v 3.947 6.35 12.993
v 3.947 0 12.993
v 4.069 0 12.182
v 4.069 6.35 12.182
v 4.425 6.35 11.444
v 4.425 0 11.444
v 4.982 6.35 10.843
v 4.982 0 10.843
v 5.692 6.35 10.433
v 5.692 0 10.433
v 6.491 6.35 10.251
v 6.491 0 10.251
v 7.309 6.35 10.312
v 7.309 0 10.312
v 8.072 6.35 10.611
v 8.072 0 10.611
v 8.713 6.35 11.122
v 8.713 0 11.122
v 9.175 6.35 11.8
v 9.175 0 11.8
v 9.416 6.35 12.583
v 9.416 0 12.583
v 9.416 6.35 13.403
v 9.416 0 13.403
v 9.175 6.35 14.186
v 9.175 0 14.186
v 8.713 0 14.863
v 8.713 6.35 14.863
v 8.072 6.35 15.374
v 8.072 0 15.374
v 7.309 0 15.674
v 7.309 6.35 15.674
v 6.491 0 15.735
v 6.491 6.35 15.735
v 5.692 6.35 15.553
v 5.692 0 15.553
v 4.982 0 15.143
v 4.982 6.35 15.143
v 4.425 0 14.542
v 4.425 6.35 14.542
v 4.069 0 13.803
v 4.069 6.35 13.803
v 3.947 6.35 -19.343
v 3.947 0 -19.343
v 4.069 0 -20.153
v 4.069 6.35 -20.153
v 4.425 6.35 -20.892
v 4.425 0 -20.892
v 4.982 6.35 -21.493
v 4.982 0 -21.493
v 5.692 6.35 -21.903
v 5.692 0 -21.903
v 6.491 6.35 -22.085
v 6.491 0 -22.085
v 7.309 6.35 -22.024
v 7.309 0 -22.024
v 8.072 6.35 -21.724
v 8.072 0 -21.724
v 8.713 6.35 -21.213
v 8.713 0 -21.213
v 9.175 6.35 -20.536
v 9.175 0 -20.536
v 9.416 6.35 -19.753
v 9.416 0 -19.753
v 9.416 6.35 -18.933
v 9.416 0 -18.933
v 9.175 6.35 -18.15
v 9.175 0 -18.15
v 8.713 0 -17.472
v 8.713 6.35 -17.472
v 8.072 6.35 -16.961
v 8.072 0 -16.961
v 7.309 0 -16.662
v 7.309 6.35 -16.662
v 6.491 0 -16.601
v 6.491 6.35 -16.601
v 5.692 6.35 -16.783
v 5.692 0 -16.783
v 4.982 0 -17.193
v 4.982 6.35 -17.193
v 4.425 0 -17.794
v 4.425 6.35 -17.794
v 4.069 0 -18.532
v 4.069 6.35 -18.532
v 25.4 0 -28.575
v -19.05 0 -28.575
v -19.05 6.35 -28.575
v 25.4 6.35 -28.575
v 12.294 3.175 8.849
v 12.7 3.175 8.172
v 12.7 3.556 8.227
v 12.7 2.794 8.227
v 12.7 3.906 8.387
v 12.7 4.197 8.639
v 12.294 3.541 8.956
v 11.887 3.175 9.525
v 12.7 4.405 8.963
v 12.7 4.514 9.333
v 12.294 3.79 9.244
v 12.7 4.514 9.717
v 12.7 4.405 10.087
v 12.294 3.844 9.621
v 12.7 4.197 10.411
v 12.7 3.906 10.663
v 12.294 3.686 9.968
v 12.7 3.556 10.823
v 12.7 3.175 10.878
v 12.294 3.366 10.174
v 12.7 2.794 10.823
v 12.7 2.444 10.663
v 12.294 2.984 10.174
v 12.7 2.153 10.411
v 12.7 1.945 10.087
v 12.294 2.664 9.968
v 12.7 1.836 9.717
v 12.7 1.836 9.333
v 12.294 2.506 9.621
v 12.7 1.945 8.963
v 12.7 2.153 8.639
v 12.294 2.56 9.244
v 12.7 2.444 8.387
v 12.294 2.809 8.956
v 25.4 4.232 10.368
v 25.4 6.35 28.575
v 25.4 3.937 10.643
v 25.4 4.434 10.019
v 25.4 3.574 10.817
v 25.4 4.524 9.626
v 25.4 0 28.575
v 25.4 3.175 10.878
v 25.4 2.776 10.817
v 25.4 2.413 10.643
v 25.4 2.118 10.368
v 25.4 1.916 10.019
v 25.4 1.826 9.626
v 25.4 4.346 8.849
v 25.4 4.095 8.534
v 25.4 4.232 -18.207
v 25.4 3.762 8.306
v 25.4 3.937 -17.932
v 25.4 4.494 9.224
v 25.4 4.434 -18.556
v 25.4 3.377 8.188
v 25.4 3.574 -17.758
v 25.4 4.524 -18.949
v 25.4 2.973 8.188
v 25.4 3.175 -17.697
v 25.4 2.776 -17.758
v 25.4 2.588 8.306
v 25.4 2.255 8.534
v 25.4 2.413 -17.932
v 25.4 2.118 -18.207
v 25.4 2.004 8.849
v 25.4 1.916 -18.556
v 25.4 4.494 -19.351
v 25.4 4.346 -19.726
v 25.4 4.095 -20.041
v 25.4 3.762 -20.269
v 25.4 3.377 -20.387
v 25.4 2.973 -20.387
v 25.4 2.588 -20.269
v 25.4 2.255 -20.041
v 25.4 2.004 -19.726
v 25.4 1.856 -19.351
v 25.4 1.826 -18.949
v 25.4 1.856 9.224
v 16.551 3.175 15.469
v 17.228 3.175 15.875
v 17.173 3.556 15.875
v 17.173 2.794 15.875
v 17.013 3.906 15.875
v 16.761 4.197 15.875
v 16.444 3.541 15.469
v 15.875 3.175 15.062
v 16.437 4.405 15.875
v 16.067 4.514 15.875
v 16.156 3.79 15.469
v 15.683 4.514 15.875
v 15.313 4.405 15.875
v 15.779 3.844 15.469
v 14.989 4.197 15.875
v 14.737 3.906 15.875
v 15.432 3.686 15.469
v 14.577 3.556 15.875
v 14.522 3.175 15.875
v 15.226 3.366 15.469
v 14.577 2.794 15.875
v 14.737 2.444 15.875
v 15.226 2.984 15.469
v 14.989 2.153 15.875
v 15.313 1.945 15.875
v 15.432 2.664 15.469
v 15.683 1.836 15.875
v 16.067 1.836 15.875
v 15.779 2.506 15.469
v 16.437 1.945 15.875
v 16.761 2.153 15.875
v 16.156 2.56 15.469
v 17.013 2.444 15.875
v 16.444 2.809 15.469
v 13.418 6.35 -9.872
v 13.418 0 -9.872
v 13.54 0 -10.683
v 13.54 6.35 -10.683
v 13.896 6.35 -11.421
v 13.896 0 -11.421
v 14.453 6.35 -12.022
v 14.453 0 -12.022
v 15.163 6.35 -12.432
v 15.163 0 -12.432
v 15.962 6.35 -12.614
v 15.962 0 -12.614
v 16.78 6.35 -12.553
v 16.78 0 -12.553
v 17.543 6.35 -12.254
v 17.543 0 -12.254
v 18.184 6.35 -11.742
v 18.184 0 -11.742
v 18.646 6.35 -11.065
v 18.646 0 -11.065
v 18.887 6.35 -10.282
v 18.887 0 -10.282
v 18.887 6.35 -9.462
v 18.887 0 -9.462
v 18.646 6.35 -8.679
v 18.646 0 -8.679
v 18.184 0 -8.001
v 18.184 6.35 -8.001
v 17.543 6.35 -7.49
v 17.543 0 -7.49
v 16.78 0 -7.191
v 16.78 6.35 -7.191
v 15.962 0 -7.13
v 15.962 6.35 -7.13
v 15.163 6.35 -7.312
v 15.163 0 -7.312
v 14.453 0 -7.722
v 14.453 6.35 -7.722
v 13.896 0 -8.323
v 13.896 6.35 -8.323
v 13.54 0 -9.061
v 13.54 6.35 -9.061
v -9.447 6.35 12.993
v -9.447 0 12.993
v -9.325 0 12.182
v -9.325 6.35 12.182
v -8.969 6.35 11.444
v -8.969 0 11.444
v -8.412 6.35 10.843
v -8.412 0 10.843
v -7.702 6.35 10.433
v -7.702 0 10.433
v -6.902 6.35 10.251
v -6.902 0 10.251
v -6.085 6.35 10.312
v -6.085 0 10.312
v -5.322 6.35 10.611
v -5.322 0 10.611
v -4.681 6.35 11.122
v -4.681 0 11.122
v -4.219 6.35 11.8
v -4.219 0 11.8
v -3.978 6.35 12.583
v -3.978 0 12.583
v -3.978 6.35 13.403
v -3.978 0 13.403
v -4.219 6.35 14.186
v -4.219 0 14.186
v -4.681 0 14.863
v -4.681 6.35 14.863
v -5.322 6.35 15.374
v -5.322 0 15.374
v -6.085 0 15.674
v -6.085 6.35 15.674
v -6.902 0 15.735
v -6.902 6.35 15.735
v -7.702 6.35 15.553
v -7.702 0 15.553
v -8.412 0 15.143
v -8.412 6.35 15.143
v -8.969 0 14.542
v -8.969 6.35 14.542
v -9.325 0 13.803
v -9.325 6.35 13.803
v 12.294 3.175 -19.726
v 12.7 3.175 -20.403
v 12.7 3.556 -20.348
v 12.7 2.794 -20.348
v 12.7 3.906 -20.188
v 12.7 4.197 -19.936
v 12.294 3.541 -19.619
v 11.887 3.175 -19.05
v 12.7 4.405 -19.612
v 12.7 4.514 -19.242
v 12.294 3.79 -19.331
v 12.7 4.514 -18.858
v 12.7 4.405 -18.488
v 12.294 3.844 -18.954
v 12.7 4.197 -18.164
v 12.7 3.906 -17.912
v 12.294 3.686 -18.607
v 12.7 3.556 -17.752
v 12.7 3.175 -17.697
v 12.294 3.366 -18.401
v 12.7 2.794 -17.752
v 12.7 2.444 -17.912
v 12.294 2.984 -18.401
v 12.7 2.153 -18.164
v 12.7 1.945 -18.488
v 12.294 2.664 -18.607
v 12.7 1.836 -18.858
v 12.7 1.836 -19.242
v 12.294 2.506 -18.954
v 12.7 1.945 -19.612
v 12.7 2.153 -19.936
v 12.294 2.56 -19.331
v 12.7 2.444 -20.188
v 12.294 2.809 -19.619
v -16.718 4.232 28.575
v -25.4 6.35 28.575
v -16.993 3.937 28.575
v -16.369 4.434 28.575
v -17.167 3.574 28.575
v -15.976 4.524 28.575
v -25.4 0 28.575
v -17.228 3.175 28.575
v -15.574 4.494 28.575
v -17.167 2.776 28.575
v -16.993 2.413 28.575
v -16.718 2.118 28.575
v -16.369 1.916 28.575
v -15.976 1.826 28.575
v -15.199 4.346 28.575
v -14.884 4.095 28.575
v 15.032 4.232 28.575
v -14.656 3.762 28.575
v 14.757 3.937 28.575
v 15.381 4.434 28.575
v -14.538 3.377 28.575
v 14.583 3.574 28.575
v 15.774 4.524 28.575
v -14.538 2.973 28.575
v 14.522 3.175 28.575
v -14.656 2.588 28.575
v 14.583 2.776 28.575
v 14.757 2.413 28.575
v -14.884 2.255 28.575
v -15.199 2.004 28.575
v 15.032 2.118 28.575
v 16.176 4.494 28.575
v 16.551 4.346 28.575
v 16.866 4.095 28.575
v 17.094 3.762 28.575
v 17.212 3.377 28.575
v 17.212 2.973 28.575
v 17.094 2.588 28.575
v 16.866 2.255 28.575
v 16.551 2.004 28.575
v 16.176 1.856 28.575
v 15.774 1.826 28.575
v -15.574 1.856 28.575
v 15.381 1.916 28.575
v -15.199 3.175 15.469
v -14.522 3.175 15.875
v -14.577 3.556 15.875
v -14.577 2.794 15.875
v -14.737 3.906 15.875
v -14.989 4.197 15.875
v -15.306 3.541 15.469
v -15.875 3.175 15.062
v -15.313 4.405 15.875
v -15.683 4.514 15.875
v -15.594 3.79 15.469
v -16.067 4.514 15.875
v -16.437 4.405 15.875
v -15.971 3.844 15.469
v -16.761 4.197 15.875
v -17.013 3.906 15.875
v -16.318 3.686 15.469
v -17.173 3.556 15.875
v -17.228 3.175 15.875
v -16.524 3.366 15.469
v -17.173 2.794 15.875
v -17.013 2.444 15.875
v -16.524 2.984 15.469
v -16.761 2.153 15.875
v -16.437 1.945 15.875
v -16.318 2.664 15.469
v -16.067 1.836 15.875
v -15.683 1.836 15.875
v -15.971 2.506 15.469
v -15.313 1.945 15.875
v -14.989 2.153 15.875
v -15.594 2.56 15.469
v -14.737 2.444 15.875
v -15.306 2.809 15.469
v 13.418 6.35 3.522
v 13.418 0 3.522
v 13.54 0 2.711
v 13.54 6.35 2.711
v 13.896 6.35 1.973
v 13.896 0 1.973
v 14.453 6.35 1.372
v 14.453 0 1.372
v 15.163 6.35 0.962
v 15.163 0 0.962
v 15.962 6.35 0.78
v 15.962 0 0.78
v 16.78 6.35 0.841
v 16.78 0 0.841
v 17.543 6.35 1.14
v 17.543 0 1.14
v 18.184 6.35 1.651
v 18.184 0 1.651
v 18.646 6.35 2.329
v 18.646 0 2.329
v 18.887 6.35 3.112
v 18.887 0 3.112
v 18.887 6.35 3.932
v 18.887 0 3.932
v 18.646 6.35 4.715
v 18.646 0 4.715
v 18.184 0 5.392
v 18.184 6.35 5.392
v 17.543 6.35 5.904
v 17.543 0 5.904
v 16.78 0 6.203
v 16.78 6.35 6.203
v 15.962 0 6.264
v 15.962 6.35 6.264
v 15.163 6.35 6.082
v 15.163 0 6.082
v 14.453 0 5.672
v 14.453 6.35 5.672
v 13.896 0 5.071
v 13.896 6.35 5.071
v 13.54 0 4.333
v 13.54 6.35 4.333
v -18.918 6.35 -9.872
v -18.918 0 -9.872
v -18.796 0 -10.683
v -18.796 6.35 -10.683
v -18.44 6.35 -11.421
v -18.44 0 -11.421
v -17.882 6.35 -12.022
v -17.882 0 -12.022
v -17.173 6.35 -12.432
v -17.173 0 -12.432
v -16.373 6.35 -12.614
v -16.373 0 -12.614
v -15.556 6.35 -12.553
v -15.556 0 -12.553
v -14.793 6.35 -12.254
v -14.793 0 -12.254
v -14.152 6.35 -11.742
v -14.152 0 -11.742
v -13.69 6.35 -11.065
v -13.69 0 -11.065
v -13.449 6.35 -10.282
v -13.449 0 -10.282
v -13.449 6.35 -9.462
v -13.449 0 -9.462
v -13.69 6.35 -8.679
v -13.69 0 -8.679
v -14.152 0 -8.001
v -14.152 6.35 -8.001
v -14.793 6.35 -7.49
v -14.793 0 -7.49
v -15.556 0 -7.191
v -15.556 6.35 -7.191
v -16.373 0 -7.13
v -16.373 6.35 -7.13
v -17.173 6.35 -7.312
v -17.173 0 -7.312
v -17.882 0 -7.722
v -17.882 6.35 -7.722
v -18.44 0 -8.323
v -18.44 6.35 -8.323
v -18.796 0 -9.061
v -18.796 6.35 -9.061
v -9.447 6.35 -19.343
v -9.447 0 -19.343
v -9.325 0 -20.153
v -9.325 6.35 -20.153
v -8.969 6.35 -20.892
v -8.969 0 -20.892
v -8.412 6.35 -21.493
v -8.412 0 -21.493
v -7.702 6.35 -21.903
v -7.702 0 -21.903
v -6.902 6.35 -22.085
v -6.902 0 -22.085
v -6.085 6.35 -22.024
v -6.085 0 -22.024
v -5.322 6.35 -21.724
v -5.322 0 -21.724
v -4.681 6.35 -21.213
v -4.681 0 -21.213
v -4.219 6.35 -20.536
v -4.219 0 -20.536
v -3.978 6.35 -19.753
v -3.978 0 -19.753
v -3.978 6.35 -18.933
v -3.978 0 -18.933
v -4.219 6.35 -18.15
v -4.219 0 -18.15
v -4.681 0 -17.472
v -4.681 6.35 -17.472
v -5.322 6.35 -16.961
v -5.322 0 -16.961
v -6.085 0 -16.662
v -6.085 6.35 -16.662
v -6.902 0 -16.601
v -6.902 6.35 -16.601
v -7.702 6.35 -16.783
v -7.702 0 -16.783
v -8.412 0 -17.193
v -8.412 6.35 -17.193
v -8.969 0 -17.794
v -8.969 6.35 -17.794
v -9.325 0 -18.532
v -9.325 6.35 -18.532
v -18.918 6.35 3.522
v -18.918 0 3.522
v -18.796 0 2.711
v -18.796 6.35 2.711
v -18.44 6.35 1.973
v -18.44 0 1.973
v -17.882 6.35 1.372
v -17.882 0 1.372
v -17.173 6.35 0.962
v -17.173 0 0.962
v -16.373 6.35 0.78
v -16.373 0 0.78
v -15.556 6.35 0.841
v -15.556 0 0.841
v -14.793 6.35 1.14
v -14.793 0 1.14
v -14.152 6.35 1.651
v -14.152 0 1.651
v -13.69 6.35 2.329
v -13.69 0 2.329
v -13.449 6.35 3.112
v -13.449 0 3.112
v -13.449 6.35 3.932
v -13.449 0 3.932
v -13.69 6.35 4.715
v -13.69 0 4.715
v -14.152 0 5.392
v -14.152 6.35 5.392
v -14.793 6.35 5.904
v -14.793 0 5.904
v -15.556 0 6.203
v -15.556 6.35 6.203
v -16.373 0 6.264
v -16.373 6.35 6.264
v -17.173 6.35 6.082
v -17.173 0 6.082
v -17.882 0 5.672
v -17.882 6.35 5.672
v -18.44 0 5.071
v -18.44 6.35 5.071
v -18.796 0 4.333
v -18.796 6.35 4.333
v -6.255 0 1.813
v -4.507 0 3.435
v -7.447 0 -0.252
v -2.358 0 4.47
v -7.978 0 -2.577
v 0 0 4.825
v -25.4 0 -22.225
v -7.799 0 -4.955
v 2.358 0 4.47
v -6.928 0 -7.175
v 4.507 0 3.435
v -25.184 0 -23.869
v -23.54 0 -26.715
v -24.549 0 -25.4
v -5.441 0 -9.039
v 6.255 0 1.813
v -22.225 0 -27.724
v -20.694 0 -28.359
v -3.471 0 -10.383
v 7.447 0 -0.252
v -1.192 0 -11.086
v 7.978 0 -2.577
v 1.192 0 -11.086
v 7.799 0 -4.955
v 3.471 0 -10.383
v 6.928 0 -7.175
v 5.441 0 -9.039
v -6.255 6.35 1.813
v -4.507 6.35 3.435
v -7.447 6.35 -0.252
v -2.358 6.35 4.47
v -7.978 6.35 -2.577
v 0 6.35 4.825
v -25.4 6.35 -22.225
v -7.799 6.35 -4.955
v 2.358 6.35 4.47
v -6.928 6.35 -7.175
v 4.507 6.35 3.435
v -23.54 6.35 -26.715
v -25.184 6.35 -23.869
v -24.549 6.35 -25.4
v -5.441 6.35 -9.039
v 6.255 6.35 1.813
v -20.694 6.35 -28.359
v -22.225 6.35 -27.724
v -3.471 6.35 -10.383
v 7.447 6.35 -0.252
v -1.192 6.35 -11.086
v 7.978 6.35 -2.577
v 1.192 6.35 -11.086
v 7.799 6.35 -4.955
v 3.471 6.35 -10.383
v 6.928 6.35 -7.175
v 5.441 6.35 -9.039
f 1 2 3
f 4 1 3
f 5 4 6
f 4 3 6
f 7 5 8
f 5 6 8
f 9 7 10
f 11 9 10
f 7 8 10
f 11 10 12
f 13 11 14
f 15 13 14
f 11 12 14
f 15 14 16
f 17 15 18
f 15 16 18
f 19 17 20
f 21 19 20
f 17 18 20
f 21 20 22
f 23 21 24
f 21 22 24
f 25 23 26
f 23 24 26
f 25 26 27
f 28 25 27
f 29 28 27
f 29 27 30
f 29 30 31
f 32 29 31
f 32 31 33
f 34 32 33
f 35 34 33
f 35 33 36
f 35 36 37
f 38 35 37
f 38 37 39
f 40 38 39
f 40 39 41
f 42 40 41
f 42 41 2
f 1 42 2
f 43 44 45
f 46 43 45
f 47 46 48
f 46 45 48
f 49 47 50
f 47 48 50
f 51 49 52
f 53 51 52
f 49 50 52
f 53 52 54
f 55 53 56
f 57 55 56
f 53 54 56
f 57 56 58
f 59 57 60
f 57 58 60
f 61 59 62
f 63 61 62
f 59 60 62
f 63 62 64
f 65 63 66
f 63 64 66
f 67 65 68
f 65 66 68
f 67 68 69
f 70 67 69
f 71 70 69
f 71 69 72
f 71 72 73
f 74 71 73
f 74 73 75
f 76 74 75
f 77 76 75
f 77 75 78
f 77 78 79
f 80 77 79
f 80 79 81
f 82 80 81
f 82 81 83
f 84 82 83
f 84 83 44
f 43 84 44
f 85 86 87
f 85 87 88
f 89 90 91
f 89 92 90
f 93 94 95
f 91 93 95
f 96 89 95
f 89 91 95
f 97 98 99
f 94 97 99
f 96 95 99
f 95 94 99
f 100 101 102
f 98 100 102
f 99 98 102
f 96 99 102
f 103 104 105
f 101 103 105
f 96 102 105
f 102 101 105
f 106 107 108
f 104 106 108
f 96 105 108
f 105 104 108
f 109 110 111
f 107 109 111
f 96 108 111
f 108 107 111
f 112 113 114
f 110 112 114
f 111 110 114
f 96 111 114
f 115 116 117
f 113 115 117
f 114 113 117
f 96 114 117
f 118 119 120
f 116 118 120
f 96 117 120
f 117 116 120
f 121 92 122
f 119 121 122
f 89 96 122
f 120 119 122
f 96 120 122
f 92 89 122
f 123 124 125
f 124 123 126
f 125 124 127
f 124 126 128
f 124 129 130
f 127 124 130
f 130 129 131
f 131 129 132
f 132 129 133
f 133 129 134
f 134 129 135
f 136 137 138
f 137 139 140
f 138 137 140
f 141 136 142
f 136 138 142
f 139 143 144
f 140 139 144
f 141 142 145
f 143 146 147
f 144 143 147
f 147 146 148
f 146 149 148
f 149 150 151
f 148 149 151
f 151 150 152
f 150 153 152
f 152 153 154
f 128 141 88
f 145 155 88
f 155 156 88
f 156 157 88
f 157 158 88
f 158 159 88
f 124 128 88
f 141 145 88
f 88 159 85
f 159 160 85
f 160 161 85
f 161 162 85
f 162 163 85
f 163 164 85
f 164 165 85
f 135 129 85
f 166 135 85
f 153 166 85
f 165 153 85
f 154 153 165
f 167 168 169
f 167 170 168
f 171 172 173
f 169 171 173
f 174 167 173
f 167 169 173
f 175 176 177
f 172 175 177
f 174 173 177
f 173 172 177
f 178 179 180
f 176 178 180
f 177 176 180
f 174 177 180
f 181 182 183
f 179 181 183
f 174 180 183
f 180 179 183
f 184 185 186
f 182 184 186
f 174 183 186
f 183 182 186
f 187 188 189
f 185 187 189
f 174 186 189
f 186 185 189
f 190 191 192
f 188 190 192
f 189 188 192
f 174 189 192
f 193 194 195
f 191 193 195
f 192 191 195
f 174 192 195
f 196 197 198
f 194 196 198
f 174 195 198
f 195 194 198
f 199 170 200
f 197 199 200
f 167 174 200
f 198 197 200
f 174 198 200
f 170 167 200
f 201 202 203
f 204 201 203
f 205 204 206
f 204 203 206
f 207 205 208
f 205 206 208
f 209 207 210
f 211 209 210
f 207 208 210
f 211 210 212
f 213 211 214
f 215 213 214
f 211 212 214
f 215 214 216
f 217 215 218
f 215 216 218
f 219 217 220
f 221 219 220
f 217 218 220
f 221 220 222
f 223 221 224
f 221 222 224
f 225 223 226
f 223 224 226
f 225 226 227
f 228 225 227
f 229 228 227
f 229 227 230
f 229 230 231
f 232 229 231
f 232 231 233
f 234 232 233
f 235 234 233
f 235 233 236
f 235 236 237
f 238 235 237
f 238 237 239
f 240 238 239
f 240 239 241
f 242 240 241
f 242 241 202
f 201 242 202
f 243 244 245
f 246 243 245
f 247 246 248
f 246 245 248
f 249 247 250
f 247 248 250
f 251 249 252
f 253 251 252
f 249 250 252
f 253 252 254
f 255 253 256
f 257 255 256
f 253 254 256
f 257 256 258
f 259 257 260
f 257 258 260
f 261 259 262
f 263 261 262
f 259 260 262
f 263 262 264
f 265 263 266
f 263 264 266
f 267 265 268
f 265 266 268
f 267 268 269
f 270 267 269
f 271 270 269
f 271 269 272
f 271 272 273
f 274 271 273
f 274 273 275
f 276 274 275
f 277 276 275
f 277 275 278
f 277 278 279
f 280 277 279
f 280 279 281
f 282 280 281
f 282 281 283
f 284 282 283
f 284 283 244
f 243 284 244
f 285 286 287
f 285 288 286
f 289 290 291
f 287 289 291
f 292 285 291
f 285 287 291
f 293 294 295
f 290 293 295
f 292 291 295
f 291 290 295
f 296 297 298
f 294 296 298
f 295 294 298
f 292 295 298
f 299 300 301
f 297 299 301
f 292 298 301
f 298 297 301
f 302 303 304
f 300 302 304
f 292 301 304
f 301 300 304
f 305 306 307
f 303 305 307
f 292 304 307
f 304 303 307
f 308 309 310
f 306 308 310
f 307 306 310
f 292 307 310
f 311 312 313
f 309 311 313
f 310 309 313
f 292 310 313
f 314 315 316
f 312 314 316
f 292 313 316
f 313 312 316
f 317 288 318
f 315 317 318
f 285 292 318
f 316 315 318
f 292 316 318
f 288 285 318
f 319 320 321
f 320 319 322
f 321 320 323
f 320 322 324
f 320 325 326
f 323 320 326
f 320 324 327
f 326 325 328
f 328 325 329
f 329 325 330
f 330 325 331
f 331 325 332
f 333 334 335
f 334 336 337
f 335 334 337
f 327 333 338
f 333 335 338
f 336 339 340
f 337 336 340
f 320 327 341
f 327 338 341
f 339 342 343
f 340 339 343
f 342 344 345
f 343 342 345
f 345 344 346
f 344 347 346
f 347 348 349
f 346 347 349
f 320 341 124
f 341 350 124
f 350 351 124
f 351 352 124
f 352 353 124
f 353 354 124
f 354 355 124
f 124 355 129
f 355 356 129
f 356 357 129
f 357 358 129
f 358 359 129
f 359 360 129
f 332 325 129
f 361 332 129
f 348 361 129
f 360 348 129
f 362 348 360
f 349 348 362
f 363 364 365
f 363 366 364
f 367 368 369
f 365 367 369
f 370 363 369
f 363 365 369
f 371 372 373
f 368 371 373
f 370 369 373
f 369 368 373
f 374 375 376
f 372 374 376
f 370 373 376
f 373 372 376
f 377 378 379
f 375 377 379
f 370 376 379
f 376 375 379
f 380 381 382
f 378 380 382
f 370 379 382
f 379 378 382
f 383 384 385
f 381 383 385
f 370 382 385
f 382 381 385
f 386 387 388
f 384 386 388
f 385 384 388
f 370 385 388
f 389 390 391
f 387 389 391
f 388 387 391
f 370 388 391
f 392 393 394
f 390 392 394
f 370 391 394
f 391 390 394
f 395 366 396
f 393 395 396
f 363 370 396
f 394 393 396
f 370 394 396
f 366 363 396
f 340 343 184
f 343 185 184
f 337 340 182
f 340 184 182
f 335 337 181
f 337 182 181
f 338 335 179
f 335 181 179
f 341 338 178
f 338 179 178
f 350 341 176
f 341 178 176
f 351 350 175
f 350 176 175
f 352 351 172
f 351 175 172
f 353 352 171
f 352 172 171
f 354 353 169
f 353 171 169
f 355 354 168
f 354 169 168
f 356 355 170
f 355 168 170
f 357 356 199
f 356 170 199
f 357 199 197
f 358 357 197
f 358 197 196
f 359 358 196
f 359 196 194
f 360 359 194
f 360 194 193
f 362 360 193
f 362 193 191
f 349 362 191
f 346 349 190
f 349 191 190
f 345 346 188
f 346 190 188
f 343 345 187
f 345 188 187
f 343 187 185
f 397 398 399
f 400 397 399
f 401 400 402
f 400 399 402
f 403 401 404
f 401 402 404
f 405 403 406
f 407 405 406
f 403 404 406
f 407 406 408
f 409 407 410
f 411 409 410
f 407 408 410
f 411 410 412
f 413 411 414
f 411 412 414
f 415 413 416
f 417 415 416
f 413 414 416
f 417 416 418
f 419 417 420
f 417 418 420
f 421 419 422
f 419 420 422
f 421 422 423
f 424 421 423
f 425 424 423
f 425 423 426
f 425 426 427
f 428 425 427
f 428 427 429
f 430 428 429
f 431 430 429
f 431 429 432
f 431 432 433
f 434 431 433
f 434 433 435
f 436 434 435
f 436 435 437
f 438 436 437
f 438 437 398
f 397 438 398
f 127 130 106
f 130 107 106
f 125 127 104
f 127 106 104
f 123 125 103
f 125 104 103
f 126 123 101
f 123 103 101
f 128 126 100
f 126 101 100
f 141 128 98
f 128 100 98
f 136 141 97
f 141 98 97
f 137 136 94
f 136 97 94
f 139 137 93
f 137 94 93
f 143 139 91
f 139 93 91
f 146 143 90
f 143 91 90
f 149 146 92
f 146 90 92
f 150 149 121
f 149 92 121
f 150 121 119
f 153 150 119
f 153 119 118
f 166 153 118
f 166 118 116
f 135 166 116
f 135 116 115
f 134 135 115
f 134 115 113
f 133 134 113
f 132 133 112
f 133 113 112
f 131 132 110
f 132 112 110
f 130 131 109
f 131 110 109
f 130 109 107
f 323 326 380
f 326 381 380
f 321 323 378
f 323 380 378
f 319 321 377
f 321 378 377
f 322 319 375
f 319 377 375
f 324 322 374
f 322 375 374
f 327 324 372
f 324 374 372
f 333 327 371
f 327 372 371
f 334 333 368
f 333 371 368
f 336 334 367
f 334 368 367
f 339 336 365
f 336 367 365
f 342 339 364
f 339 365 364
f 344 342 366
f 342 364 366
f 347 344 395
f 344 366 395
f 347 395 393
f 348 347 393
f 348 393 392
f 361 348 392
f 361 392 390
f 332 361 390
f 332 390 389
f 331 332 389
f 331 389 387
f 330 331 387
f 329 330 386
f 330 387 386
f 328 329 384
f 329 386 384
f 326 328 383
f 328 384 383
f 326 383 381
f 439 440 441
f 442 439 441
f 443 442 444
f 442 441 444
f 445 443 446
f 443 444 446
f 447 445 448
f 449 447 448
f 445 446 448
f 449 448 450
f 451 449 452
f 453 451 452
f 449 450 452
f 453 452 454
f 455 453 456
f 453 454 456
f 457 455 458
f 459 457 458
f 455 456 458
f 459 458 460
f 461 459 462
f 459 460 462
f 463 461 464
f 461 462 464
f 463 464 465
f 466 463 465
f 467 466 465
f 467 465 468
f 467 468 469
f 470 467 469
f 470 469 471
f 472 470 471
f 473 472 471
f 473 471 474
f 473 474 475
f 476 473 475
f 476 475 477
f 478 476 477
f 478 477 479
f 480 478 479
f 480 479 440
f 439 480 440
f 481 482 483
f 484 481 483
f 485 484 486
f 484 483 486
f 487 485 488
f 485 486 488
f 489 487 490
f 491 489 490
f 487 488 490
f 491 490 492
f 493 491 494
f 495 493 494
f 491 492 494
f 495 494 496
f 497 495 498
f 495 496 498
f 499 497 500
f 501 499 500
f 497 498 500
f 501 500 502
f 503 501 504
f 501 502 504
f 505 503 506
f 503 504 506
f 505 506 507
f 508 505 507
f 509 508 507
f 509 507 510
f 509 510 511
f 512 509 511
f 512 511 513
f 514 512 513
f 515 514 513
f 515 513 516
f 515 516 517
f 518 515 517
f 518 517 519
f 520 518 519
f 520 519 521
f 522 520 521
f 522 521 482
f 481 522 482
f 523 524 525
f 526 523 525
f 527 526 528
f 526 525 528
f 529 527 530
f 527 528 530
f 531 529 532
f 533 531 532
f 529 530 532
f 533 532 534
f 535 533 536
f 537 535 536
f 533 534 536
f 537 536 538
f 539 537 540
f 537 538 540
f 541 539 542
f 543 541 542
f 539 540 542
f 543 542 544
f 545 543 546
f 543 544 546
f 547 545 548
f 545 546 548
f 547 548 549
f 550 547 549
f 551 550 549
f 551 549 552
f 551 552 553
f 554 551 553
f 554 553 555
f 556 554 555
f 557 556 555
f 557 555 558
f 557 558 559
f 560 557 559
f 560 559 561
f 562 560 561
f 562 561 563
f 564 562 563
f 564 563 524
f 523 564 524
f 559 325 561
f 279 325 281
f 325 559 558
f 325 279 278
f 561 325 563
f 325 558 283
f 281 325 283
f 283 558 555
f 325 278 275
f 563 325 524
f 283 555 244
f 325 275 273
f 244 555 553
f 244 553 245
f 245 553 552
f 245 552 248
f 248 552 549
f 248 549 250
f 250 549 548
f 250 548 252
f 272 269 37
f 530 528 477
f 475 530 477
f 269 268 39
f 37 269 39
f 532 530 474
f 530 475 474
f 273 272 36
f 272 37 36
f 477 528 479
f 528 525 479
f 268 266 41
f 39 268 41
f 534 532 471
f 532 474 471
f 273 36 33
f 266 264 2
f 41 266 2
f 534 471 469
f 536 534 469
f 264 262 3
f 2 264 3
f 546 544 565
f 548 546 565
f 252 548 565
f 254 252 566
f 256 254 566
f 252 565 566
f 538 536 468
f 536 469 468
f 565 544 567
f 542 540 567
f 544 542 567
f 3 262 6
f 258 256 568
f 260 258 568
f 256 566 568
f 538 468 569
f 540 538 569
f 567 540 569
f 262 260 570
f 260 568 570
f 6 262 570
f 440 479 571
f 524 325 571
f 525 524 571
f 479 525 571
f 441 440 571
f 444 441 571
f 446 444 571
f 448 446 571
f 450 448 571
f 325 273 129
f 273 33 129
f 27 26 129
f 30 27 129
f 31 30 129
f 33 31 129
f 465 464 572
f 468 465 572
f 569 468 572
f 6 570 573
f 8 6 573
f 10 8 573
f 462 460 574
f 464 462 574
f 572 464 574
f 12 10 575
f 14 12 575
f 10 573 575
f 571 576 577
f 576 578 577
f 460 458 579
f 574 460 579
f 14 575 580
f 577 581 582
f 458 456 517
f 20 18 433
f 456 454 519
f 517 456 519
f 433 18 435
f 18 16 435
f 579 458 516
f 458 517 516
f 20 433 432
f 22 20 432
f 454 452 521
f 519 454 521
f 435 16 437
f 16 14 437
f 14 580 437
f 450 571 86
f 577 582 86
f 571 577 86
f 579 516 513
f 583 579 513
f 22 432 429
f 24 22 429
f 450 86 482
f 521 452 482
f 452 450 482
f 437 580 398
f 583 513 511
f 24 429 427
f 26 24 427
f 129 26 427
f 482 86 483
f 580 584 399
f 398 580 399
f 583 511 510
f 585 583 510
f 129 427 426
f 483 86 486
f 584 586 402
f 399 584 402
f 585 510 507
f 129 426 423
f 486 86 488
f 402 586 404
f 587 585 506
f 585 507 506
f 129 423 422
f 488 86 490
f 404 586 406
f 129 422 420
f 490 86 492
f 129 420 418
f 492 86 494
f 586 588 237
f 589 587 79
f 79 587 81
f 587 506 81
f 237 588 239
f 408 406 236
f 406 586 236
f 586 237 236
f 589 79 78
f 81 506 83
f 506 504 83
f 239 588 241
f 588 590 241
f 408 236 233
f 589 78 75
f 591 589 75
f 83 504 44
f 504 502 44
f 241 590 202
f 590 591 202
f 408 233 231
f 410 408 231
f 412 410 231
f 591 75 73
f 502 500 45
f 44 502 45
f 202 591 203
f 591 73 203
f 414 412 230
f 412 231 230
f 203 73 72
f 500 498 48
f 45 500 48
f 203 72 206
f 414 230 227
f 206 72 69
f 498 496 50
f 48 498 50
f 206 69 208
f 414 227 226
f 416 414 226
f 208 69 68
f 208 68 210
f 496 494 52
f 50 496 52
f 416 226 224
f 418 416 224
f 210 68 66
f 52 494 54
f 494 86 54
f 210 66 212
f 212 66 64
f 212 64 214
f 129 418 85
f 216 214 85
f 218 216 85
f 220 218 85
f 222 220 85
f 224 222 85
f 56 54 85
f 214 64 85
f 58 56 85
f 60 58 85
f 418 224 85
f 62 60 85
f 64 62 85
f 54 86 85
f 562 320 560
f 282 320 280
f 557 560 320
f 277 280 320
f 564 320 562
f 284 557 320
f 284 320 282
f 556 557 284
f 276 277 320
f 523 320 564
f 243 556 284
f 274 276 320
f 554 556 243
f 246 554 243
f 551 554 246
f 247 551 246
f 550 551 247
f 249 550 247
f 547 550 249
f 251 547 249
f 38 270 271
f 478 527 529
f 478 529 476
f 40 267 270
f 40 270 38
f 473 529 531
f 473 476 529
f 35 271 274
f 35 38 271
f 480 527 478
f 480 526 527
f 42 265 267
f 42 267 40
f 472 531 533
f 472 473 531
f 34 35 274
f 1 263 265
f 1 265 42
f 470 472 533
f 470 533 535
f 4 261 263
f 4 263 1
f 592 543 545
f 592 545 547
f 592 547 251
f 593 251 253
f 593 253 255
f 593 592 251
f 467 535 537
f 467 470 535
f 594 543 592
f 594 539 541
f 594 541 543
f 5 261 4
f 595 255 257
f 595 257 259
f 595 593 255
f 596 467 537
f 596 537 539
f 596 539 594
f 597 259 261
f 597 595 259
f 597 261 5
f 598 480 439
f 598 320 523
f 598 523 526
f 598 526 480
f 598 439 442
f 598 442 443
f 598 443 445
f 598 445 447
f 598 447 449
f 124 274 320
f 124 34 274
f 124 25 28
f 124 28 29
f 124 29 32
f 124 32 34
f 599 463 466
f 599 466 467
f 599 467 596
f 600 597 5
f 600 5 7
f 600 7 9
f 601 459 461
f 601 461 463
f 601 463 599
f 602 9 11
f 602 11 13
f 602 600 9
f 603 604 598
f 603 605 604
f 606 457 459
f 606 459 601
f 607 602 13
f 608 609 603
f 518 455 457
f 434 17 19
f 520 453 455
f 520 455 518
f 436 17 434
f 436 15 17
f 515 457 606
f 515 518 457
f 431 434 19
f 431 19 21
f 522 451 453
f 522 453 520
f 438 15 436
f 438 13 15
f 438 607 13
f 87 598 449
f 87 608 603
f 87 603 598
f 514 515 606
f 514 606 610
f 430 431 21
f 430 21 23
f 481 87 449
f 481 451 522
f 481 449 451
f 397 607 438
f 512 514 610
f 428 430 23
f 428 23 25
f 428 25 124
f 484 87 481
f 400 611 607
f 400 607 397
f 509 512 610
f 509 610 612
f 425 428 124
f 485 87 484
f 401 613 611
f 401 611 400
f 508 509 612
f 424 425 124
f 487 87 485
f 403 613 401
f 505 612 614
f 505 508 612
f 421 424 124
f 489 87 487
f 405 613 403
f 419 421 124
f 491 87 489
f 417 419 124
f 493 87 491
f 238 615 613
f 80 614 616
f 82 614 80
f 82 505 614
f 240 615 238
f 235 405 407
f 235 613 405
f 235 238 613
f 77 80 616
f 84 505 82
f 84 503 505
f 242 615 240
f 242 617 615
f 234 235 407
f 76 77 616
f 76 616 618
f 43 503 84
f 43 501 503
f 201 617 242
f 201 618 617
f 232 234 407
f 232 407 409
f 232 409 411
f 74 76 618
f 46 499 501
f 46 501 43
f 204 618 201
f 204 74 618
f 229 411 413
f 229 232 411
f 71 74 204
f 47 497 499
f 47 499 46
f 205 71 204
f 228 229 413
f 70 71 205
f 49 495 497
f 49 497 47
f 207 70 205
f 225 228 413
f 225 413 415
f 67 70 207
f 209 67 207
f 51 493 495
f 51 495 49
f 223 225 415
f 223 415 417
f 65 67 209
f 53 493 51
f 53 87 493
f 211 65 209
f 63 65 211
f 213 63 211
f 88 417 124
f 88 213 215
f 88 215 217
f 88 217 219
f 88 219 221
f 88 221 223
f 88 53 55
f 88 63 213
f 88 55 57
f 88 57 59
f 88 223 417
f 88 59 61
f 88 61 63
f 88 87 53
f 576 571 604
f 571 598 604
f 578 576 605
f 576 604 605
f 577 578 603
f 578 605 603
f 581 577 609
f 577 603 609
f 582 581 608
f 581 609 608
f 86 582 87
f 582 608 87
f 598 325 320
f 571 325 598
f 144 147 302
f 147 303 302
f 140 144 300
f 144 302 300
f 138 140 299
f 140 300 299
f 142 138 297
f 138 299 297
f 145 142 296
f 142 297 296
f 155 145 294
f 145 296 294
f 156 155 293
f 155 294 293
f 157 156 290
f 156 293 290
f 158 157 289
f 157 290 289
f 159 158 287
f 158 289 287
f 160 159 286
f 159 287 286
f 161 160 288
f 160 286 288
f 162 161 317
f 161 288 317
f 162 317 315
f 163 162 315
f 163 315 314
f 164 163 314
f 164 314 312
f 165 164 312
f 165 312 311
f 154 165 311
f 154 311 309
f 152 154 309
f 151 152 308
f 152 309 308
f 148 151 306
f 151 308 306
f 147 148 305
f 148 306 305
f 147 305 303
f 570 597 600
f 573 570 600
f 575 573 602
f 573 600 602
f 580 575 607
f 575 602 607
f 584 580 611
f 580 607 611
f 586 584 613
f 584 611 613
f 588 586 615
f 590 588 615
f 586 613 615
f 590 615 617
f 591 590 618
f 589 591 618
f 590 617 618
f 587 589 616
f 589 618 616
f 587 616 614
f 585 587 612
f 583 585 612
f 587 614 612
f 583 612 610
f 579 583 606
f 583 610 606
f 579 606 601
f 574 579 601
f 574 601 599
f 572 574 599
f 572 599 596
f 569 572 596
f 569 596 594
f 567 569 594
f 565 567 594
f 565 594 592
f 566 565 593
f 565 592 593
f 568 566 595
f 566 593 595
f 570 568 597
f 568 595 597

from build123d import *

# Parameters (mm, degrees)
SKETCH1_W                     = 50.8
SKETCH1_H                     = 57.15
BOSS_EXTRUDE1_DEPTH           = 6.35
M5_CLEARANCE_HOLE1_D          = 5.5
M5_CLEARANCE_HOLE1_DEPTH      = 12.7
M5_CLEARANCE_HOLE1_TIP        = 1.652366702
TAP_DRILL_FOR_6_32_TAP1_D     = 2.7051
TAP_DRILL_FOR_6_32_TAP1_DEPTH = 12.7
TAP_DRILL_FOR_6_32_TAP1_TIP   = 0.81269403
TAP_DRILL_FOR_6_32_TAP2_D     = 2.7051
TAP_DRILL_FOR_6_32_TAP2_DEPTH = 12.7
TAP_DRILL_FOR_6_32_TAP2_TIP   = 0.81269403
FILLET1_R                     = 6.35
SKETCH8_R                     = 8
CUT_EXTRUDE1_DEPTH            = 6.35


with BuildPart() as part:
    # Sketch1 → Boss-Extrude1 (new body)
    with BuildSketch(Plane(origin=(0, 0, 0), x_dir=(1, 0, 0), z_dir=(0, 1, 0))):
        Rectangle(SKETCH1_W, SKETCH1_H)
    extrude(amount=BOSS_EXTRUDE1_DEPTH)

    # M5 Clearance Hole1
    with Locations(Plane(origin=(0, 6.35, 0), x_dir=(1, 0, 0), z_dir=(0, 1, 0))):
        with Locations((-16.167891819, 9.871960066), (-6.696960066, -12.992891819), (16.167891819, -3.521960066), (-6.696960066, 19.342891819), (6.696960066, 19.342891819), (16.167891819, 9.871960066), (-16.167891819, -3.521960066), (6.696960066, -12.992891819)):
            Hole(M5_CLEARANCE_HOLE1_D / 2, depth=M5_CLEARANCE_HOLE1_DEPTH)
            with Locations((0, 0, -(M5_CLEARANCE_HOLE1_DEPTH + M5_CLEARANCE_HOLE1_TIP / 2))):  # 118° drill point
                Cone(0, M5_CLEARANCE_HOLE1_D / 2, M5_CLEARANCE_HOLE1_TIP, mode=Mode.SUBTRACT)

    # Tap Drill for #6-32 Tap1
    with Locations(Plane.XY.offset(28.575)):
        with Locations((-15.875, 3.175), (15.875, 3.175)):
            Hole(TAP_DRILL_FOR_6_32_TAP1_D / 2, depth=TAP_DRILL_FOR_6_32_TAP1_DEPTH)
            with Locations((0, 0, -(TAP_DRILL_FOR_6_32_TAP1_DEPTH + TAP_DRILL_FOR_6_32_TAP1_TIP / 2))):  # 118° drill point
                Cone(0, TAP_DRILL_FOR_6_32_TAP1_D / 2, TAP_DRILL_FOR_6_32_TAP1_TIP, mode=Mode.SUBTRACT)

    # Tap Drill for #6-32 Tap2
    with Locations(Plane(origin=(25.4, 0, 0), x_dir=(0, 0, -1), z_dir=(1, 0, 0))):
        with Locations((-9.525, 3.175), (19.05, 3.175)):
            Hole(TAP_DRILL_FOR_6_32_TAP2_D / 2, depth=TAP_DRILL_FOR_6_32_TAP2_DEPTH)
            with Locations((0, 0, -(TAP_DRILL_FOR_6_32_TAP2_DEPTH + TAP_DRILL_FOR_6_32_TAP2_TIP / 2))):  # 118° drill point
                Cone(0, TAP_DRILL_FOR_6_32_TAP2_D / 2, TAP_DRILL_FOR_6_32_TAP2_TIP, mode=Mode.SUBTRACT)

    # Fillet1
    fillet1_edges = [part.edges().sort_by_distance(p)[0] for p in [
        (-25.4, 3.175, -28.575),
    ]]
    fillet(fillet1_edges, radius=FILLET1_R)

    # Sketch8 → Cut-Extrude1 (cut)
    with BuildSketch(Plane(origin=(0, 6.35, 0), x_dir=(1, 0, 0), z_dir=(0, 1, 0))):
        with Locations(Location((0, 3.175, 0), (0, 0, 270))):
            Circle(SKETCH8_R)
    extrude(amount=-CUT_EXTRUDE1_DEPTH, mode=Mode.SUBTRACT)


solid = part.part
